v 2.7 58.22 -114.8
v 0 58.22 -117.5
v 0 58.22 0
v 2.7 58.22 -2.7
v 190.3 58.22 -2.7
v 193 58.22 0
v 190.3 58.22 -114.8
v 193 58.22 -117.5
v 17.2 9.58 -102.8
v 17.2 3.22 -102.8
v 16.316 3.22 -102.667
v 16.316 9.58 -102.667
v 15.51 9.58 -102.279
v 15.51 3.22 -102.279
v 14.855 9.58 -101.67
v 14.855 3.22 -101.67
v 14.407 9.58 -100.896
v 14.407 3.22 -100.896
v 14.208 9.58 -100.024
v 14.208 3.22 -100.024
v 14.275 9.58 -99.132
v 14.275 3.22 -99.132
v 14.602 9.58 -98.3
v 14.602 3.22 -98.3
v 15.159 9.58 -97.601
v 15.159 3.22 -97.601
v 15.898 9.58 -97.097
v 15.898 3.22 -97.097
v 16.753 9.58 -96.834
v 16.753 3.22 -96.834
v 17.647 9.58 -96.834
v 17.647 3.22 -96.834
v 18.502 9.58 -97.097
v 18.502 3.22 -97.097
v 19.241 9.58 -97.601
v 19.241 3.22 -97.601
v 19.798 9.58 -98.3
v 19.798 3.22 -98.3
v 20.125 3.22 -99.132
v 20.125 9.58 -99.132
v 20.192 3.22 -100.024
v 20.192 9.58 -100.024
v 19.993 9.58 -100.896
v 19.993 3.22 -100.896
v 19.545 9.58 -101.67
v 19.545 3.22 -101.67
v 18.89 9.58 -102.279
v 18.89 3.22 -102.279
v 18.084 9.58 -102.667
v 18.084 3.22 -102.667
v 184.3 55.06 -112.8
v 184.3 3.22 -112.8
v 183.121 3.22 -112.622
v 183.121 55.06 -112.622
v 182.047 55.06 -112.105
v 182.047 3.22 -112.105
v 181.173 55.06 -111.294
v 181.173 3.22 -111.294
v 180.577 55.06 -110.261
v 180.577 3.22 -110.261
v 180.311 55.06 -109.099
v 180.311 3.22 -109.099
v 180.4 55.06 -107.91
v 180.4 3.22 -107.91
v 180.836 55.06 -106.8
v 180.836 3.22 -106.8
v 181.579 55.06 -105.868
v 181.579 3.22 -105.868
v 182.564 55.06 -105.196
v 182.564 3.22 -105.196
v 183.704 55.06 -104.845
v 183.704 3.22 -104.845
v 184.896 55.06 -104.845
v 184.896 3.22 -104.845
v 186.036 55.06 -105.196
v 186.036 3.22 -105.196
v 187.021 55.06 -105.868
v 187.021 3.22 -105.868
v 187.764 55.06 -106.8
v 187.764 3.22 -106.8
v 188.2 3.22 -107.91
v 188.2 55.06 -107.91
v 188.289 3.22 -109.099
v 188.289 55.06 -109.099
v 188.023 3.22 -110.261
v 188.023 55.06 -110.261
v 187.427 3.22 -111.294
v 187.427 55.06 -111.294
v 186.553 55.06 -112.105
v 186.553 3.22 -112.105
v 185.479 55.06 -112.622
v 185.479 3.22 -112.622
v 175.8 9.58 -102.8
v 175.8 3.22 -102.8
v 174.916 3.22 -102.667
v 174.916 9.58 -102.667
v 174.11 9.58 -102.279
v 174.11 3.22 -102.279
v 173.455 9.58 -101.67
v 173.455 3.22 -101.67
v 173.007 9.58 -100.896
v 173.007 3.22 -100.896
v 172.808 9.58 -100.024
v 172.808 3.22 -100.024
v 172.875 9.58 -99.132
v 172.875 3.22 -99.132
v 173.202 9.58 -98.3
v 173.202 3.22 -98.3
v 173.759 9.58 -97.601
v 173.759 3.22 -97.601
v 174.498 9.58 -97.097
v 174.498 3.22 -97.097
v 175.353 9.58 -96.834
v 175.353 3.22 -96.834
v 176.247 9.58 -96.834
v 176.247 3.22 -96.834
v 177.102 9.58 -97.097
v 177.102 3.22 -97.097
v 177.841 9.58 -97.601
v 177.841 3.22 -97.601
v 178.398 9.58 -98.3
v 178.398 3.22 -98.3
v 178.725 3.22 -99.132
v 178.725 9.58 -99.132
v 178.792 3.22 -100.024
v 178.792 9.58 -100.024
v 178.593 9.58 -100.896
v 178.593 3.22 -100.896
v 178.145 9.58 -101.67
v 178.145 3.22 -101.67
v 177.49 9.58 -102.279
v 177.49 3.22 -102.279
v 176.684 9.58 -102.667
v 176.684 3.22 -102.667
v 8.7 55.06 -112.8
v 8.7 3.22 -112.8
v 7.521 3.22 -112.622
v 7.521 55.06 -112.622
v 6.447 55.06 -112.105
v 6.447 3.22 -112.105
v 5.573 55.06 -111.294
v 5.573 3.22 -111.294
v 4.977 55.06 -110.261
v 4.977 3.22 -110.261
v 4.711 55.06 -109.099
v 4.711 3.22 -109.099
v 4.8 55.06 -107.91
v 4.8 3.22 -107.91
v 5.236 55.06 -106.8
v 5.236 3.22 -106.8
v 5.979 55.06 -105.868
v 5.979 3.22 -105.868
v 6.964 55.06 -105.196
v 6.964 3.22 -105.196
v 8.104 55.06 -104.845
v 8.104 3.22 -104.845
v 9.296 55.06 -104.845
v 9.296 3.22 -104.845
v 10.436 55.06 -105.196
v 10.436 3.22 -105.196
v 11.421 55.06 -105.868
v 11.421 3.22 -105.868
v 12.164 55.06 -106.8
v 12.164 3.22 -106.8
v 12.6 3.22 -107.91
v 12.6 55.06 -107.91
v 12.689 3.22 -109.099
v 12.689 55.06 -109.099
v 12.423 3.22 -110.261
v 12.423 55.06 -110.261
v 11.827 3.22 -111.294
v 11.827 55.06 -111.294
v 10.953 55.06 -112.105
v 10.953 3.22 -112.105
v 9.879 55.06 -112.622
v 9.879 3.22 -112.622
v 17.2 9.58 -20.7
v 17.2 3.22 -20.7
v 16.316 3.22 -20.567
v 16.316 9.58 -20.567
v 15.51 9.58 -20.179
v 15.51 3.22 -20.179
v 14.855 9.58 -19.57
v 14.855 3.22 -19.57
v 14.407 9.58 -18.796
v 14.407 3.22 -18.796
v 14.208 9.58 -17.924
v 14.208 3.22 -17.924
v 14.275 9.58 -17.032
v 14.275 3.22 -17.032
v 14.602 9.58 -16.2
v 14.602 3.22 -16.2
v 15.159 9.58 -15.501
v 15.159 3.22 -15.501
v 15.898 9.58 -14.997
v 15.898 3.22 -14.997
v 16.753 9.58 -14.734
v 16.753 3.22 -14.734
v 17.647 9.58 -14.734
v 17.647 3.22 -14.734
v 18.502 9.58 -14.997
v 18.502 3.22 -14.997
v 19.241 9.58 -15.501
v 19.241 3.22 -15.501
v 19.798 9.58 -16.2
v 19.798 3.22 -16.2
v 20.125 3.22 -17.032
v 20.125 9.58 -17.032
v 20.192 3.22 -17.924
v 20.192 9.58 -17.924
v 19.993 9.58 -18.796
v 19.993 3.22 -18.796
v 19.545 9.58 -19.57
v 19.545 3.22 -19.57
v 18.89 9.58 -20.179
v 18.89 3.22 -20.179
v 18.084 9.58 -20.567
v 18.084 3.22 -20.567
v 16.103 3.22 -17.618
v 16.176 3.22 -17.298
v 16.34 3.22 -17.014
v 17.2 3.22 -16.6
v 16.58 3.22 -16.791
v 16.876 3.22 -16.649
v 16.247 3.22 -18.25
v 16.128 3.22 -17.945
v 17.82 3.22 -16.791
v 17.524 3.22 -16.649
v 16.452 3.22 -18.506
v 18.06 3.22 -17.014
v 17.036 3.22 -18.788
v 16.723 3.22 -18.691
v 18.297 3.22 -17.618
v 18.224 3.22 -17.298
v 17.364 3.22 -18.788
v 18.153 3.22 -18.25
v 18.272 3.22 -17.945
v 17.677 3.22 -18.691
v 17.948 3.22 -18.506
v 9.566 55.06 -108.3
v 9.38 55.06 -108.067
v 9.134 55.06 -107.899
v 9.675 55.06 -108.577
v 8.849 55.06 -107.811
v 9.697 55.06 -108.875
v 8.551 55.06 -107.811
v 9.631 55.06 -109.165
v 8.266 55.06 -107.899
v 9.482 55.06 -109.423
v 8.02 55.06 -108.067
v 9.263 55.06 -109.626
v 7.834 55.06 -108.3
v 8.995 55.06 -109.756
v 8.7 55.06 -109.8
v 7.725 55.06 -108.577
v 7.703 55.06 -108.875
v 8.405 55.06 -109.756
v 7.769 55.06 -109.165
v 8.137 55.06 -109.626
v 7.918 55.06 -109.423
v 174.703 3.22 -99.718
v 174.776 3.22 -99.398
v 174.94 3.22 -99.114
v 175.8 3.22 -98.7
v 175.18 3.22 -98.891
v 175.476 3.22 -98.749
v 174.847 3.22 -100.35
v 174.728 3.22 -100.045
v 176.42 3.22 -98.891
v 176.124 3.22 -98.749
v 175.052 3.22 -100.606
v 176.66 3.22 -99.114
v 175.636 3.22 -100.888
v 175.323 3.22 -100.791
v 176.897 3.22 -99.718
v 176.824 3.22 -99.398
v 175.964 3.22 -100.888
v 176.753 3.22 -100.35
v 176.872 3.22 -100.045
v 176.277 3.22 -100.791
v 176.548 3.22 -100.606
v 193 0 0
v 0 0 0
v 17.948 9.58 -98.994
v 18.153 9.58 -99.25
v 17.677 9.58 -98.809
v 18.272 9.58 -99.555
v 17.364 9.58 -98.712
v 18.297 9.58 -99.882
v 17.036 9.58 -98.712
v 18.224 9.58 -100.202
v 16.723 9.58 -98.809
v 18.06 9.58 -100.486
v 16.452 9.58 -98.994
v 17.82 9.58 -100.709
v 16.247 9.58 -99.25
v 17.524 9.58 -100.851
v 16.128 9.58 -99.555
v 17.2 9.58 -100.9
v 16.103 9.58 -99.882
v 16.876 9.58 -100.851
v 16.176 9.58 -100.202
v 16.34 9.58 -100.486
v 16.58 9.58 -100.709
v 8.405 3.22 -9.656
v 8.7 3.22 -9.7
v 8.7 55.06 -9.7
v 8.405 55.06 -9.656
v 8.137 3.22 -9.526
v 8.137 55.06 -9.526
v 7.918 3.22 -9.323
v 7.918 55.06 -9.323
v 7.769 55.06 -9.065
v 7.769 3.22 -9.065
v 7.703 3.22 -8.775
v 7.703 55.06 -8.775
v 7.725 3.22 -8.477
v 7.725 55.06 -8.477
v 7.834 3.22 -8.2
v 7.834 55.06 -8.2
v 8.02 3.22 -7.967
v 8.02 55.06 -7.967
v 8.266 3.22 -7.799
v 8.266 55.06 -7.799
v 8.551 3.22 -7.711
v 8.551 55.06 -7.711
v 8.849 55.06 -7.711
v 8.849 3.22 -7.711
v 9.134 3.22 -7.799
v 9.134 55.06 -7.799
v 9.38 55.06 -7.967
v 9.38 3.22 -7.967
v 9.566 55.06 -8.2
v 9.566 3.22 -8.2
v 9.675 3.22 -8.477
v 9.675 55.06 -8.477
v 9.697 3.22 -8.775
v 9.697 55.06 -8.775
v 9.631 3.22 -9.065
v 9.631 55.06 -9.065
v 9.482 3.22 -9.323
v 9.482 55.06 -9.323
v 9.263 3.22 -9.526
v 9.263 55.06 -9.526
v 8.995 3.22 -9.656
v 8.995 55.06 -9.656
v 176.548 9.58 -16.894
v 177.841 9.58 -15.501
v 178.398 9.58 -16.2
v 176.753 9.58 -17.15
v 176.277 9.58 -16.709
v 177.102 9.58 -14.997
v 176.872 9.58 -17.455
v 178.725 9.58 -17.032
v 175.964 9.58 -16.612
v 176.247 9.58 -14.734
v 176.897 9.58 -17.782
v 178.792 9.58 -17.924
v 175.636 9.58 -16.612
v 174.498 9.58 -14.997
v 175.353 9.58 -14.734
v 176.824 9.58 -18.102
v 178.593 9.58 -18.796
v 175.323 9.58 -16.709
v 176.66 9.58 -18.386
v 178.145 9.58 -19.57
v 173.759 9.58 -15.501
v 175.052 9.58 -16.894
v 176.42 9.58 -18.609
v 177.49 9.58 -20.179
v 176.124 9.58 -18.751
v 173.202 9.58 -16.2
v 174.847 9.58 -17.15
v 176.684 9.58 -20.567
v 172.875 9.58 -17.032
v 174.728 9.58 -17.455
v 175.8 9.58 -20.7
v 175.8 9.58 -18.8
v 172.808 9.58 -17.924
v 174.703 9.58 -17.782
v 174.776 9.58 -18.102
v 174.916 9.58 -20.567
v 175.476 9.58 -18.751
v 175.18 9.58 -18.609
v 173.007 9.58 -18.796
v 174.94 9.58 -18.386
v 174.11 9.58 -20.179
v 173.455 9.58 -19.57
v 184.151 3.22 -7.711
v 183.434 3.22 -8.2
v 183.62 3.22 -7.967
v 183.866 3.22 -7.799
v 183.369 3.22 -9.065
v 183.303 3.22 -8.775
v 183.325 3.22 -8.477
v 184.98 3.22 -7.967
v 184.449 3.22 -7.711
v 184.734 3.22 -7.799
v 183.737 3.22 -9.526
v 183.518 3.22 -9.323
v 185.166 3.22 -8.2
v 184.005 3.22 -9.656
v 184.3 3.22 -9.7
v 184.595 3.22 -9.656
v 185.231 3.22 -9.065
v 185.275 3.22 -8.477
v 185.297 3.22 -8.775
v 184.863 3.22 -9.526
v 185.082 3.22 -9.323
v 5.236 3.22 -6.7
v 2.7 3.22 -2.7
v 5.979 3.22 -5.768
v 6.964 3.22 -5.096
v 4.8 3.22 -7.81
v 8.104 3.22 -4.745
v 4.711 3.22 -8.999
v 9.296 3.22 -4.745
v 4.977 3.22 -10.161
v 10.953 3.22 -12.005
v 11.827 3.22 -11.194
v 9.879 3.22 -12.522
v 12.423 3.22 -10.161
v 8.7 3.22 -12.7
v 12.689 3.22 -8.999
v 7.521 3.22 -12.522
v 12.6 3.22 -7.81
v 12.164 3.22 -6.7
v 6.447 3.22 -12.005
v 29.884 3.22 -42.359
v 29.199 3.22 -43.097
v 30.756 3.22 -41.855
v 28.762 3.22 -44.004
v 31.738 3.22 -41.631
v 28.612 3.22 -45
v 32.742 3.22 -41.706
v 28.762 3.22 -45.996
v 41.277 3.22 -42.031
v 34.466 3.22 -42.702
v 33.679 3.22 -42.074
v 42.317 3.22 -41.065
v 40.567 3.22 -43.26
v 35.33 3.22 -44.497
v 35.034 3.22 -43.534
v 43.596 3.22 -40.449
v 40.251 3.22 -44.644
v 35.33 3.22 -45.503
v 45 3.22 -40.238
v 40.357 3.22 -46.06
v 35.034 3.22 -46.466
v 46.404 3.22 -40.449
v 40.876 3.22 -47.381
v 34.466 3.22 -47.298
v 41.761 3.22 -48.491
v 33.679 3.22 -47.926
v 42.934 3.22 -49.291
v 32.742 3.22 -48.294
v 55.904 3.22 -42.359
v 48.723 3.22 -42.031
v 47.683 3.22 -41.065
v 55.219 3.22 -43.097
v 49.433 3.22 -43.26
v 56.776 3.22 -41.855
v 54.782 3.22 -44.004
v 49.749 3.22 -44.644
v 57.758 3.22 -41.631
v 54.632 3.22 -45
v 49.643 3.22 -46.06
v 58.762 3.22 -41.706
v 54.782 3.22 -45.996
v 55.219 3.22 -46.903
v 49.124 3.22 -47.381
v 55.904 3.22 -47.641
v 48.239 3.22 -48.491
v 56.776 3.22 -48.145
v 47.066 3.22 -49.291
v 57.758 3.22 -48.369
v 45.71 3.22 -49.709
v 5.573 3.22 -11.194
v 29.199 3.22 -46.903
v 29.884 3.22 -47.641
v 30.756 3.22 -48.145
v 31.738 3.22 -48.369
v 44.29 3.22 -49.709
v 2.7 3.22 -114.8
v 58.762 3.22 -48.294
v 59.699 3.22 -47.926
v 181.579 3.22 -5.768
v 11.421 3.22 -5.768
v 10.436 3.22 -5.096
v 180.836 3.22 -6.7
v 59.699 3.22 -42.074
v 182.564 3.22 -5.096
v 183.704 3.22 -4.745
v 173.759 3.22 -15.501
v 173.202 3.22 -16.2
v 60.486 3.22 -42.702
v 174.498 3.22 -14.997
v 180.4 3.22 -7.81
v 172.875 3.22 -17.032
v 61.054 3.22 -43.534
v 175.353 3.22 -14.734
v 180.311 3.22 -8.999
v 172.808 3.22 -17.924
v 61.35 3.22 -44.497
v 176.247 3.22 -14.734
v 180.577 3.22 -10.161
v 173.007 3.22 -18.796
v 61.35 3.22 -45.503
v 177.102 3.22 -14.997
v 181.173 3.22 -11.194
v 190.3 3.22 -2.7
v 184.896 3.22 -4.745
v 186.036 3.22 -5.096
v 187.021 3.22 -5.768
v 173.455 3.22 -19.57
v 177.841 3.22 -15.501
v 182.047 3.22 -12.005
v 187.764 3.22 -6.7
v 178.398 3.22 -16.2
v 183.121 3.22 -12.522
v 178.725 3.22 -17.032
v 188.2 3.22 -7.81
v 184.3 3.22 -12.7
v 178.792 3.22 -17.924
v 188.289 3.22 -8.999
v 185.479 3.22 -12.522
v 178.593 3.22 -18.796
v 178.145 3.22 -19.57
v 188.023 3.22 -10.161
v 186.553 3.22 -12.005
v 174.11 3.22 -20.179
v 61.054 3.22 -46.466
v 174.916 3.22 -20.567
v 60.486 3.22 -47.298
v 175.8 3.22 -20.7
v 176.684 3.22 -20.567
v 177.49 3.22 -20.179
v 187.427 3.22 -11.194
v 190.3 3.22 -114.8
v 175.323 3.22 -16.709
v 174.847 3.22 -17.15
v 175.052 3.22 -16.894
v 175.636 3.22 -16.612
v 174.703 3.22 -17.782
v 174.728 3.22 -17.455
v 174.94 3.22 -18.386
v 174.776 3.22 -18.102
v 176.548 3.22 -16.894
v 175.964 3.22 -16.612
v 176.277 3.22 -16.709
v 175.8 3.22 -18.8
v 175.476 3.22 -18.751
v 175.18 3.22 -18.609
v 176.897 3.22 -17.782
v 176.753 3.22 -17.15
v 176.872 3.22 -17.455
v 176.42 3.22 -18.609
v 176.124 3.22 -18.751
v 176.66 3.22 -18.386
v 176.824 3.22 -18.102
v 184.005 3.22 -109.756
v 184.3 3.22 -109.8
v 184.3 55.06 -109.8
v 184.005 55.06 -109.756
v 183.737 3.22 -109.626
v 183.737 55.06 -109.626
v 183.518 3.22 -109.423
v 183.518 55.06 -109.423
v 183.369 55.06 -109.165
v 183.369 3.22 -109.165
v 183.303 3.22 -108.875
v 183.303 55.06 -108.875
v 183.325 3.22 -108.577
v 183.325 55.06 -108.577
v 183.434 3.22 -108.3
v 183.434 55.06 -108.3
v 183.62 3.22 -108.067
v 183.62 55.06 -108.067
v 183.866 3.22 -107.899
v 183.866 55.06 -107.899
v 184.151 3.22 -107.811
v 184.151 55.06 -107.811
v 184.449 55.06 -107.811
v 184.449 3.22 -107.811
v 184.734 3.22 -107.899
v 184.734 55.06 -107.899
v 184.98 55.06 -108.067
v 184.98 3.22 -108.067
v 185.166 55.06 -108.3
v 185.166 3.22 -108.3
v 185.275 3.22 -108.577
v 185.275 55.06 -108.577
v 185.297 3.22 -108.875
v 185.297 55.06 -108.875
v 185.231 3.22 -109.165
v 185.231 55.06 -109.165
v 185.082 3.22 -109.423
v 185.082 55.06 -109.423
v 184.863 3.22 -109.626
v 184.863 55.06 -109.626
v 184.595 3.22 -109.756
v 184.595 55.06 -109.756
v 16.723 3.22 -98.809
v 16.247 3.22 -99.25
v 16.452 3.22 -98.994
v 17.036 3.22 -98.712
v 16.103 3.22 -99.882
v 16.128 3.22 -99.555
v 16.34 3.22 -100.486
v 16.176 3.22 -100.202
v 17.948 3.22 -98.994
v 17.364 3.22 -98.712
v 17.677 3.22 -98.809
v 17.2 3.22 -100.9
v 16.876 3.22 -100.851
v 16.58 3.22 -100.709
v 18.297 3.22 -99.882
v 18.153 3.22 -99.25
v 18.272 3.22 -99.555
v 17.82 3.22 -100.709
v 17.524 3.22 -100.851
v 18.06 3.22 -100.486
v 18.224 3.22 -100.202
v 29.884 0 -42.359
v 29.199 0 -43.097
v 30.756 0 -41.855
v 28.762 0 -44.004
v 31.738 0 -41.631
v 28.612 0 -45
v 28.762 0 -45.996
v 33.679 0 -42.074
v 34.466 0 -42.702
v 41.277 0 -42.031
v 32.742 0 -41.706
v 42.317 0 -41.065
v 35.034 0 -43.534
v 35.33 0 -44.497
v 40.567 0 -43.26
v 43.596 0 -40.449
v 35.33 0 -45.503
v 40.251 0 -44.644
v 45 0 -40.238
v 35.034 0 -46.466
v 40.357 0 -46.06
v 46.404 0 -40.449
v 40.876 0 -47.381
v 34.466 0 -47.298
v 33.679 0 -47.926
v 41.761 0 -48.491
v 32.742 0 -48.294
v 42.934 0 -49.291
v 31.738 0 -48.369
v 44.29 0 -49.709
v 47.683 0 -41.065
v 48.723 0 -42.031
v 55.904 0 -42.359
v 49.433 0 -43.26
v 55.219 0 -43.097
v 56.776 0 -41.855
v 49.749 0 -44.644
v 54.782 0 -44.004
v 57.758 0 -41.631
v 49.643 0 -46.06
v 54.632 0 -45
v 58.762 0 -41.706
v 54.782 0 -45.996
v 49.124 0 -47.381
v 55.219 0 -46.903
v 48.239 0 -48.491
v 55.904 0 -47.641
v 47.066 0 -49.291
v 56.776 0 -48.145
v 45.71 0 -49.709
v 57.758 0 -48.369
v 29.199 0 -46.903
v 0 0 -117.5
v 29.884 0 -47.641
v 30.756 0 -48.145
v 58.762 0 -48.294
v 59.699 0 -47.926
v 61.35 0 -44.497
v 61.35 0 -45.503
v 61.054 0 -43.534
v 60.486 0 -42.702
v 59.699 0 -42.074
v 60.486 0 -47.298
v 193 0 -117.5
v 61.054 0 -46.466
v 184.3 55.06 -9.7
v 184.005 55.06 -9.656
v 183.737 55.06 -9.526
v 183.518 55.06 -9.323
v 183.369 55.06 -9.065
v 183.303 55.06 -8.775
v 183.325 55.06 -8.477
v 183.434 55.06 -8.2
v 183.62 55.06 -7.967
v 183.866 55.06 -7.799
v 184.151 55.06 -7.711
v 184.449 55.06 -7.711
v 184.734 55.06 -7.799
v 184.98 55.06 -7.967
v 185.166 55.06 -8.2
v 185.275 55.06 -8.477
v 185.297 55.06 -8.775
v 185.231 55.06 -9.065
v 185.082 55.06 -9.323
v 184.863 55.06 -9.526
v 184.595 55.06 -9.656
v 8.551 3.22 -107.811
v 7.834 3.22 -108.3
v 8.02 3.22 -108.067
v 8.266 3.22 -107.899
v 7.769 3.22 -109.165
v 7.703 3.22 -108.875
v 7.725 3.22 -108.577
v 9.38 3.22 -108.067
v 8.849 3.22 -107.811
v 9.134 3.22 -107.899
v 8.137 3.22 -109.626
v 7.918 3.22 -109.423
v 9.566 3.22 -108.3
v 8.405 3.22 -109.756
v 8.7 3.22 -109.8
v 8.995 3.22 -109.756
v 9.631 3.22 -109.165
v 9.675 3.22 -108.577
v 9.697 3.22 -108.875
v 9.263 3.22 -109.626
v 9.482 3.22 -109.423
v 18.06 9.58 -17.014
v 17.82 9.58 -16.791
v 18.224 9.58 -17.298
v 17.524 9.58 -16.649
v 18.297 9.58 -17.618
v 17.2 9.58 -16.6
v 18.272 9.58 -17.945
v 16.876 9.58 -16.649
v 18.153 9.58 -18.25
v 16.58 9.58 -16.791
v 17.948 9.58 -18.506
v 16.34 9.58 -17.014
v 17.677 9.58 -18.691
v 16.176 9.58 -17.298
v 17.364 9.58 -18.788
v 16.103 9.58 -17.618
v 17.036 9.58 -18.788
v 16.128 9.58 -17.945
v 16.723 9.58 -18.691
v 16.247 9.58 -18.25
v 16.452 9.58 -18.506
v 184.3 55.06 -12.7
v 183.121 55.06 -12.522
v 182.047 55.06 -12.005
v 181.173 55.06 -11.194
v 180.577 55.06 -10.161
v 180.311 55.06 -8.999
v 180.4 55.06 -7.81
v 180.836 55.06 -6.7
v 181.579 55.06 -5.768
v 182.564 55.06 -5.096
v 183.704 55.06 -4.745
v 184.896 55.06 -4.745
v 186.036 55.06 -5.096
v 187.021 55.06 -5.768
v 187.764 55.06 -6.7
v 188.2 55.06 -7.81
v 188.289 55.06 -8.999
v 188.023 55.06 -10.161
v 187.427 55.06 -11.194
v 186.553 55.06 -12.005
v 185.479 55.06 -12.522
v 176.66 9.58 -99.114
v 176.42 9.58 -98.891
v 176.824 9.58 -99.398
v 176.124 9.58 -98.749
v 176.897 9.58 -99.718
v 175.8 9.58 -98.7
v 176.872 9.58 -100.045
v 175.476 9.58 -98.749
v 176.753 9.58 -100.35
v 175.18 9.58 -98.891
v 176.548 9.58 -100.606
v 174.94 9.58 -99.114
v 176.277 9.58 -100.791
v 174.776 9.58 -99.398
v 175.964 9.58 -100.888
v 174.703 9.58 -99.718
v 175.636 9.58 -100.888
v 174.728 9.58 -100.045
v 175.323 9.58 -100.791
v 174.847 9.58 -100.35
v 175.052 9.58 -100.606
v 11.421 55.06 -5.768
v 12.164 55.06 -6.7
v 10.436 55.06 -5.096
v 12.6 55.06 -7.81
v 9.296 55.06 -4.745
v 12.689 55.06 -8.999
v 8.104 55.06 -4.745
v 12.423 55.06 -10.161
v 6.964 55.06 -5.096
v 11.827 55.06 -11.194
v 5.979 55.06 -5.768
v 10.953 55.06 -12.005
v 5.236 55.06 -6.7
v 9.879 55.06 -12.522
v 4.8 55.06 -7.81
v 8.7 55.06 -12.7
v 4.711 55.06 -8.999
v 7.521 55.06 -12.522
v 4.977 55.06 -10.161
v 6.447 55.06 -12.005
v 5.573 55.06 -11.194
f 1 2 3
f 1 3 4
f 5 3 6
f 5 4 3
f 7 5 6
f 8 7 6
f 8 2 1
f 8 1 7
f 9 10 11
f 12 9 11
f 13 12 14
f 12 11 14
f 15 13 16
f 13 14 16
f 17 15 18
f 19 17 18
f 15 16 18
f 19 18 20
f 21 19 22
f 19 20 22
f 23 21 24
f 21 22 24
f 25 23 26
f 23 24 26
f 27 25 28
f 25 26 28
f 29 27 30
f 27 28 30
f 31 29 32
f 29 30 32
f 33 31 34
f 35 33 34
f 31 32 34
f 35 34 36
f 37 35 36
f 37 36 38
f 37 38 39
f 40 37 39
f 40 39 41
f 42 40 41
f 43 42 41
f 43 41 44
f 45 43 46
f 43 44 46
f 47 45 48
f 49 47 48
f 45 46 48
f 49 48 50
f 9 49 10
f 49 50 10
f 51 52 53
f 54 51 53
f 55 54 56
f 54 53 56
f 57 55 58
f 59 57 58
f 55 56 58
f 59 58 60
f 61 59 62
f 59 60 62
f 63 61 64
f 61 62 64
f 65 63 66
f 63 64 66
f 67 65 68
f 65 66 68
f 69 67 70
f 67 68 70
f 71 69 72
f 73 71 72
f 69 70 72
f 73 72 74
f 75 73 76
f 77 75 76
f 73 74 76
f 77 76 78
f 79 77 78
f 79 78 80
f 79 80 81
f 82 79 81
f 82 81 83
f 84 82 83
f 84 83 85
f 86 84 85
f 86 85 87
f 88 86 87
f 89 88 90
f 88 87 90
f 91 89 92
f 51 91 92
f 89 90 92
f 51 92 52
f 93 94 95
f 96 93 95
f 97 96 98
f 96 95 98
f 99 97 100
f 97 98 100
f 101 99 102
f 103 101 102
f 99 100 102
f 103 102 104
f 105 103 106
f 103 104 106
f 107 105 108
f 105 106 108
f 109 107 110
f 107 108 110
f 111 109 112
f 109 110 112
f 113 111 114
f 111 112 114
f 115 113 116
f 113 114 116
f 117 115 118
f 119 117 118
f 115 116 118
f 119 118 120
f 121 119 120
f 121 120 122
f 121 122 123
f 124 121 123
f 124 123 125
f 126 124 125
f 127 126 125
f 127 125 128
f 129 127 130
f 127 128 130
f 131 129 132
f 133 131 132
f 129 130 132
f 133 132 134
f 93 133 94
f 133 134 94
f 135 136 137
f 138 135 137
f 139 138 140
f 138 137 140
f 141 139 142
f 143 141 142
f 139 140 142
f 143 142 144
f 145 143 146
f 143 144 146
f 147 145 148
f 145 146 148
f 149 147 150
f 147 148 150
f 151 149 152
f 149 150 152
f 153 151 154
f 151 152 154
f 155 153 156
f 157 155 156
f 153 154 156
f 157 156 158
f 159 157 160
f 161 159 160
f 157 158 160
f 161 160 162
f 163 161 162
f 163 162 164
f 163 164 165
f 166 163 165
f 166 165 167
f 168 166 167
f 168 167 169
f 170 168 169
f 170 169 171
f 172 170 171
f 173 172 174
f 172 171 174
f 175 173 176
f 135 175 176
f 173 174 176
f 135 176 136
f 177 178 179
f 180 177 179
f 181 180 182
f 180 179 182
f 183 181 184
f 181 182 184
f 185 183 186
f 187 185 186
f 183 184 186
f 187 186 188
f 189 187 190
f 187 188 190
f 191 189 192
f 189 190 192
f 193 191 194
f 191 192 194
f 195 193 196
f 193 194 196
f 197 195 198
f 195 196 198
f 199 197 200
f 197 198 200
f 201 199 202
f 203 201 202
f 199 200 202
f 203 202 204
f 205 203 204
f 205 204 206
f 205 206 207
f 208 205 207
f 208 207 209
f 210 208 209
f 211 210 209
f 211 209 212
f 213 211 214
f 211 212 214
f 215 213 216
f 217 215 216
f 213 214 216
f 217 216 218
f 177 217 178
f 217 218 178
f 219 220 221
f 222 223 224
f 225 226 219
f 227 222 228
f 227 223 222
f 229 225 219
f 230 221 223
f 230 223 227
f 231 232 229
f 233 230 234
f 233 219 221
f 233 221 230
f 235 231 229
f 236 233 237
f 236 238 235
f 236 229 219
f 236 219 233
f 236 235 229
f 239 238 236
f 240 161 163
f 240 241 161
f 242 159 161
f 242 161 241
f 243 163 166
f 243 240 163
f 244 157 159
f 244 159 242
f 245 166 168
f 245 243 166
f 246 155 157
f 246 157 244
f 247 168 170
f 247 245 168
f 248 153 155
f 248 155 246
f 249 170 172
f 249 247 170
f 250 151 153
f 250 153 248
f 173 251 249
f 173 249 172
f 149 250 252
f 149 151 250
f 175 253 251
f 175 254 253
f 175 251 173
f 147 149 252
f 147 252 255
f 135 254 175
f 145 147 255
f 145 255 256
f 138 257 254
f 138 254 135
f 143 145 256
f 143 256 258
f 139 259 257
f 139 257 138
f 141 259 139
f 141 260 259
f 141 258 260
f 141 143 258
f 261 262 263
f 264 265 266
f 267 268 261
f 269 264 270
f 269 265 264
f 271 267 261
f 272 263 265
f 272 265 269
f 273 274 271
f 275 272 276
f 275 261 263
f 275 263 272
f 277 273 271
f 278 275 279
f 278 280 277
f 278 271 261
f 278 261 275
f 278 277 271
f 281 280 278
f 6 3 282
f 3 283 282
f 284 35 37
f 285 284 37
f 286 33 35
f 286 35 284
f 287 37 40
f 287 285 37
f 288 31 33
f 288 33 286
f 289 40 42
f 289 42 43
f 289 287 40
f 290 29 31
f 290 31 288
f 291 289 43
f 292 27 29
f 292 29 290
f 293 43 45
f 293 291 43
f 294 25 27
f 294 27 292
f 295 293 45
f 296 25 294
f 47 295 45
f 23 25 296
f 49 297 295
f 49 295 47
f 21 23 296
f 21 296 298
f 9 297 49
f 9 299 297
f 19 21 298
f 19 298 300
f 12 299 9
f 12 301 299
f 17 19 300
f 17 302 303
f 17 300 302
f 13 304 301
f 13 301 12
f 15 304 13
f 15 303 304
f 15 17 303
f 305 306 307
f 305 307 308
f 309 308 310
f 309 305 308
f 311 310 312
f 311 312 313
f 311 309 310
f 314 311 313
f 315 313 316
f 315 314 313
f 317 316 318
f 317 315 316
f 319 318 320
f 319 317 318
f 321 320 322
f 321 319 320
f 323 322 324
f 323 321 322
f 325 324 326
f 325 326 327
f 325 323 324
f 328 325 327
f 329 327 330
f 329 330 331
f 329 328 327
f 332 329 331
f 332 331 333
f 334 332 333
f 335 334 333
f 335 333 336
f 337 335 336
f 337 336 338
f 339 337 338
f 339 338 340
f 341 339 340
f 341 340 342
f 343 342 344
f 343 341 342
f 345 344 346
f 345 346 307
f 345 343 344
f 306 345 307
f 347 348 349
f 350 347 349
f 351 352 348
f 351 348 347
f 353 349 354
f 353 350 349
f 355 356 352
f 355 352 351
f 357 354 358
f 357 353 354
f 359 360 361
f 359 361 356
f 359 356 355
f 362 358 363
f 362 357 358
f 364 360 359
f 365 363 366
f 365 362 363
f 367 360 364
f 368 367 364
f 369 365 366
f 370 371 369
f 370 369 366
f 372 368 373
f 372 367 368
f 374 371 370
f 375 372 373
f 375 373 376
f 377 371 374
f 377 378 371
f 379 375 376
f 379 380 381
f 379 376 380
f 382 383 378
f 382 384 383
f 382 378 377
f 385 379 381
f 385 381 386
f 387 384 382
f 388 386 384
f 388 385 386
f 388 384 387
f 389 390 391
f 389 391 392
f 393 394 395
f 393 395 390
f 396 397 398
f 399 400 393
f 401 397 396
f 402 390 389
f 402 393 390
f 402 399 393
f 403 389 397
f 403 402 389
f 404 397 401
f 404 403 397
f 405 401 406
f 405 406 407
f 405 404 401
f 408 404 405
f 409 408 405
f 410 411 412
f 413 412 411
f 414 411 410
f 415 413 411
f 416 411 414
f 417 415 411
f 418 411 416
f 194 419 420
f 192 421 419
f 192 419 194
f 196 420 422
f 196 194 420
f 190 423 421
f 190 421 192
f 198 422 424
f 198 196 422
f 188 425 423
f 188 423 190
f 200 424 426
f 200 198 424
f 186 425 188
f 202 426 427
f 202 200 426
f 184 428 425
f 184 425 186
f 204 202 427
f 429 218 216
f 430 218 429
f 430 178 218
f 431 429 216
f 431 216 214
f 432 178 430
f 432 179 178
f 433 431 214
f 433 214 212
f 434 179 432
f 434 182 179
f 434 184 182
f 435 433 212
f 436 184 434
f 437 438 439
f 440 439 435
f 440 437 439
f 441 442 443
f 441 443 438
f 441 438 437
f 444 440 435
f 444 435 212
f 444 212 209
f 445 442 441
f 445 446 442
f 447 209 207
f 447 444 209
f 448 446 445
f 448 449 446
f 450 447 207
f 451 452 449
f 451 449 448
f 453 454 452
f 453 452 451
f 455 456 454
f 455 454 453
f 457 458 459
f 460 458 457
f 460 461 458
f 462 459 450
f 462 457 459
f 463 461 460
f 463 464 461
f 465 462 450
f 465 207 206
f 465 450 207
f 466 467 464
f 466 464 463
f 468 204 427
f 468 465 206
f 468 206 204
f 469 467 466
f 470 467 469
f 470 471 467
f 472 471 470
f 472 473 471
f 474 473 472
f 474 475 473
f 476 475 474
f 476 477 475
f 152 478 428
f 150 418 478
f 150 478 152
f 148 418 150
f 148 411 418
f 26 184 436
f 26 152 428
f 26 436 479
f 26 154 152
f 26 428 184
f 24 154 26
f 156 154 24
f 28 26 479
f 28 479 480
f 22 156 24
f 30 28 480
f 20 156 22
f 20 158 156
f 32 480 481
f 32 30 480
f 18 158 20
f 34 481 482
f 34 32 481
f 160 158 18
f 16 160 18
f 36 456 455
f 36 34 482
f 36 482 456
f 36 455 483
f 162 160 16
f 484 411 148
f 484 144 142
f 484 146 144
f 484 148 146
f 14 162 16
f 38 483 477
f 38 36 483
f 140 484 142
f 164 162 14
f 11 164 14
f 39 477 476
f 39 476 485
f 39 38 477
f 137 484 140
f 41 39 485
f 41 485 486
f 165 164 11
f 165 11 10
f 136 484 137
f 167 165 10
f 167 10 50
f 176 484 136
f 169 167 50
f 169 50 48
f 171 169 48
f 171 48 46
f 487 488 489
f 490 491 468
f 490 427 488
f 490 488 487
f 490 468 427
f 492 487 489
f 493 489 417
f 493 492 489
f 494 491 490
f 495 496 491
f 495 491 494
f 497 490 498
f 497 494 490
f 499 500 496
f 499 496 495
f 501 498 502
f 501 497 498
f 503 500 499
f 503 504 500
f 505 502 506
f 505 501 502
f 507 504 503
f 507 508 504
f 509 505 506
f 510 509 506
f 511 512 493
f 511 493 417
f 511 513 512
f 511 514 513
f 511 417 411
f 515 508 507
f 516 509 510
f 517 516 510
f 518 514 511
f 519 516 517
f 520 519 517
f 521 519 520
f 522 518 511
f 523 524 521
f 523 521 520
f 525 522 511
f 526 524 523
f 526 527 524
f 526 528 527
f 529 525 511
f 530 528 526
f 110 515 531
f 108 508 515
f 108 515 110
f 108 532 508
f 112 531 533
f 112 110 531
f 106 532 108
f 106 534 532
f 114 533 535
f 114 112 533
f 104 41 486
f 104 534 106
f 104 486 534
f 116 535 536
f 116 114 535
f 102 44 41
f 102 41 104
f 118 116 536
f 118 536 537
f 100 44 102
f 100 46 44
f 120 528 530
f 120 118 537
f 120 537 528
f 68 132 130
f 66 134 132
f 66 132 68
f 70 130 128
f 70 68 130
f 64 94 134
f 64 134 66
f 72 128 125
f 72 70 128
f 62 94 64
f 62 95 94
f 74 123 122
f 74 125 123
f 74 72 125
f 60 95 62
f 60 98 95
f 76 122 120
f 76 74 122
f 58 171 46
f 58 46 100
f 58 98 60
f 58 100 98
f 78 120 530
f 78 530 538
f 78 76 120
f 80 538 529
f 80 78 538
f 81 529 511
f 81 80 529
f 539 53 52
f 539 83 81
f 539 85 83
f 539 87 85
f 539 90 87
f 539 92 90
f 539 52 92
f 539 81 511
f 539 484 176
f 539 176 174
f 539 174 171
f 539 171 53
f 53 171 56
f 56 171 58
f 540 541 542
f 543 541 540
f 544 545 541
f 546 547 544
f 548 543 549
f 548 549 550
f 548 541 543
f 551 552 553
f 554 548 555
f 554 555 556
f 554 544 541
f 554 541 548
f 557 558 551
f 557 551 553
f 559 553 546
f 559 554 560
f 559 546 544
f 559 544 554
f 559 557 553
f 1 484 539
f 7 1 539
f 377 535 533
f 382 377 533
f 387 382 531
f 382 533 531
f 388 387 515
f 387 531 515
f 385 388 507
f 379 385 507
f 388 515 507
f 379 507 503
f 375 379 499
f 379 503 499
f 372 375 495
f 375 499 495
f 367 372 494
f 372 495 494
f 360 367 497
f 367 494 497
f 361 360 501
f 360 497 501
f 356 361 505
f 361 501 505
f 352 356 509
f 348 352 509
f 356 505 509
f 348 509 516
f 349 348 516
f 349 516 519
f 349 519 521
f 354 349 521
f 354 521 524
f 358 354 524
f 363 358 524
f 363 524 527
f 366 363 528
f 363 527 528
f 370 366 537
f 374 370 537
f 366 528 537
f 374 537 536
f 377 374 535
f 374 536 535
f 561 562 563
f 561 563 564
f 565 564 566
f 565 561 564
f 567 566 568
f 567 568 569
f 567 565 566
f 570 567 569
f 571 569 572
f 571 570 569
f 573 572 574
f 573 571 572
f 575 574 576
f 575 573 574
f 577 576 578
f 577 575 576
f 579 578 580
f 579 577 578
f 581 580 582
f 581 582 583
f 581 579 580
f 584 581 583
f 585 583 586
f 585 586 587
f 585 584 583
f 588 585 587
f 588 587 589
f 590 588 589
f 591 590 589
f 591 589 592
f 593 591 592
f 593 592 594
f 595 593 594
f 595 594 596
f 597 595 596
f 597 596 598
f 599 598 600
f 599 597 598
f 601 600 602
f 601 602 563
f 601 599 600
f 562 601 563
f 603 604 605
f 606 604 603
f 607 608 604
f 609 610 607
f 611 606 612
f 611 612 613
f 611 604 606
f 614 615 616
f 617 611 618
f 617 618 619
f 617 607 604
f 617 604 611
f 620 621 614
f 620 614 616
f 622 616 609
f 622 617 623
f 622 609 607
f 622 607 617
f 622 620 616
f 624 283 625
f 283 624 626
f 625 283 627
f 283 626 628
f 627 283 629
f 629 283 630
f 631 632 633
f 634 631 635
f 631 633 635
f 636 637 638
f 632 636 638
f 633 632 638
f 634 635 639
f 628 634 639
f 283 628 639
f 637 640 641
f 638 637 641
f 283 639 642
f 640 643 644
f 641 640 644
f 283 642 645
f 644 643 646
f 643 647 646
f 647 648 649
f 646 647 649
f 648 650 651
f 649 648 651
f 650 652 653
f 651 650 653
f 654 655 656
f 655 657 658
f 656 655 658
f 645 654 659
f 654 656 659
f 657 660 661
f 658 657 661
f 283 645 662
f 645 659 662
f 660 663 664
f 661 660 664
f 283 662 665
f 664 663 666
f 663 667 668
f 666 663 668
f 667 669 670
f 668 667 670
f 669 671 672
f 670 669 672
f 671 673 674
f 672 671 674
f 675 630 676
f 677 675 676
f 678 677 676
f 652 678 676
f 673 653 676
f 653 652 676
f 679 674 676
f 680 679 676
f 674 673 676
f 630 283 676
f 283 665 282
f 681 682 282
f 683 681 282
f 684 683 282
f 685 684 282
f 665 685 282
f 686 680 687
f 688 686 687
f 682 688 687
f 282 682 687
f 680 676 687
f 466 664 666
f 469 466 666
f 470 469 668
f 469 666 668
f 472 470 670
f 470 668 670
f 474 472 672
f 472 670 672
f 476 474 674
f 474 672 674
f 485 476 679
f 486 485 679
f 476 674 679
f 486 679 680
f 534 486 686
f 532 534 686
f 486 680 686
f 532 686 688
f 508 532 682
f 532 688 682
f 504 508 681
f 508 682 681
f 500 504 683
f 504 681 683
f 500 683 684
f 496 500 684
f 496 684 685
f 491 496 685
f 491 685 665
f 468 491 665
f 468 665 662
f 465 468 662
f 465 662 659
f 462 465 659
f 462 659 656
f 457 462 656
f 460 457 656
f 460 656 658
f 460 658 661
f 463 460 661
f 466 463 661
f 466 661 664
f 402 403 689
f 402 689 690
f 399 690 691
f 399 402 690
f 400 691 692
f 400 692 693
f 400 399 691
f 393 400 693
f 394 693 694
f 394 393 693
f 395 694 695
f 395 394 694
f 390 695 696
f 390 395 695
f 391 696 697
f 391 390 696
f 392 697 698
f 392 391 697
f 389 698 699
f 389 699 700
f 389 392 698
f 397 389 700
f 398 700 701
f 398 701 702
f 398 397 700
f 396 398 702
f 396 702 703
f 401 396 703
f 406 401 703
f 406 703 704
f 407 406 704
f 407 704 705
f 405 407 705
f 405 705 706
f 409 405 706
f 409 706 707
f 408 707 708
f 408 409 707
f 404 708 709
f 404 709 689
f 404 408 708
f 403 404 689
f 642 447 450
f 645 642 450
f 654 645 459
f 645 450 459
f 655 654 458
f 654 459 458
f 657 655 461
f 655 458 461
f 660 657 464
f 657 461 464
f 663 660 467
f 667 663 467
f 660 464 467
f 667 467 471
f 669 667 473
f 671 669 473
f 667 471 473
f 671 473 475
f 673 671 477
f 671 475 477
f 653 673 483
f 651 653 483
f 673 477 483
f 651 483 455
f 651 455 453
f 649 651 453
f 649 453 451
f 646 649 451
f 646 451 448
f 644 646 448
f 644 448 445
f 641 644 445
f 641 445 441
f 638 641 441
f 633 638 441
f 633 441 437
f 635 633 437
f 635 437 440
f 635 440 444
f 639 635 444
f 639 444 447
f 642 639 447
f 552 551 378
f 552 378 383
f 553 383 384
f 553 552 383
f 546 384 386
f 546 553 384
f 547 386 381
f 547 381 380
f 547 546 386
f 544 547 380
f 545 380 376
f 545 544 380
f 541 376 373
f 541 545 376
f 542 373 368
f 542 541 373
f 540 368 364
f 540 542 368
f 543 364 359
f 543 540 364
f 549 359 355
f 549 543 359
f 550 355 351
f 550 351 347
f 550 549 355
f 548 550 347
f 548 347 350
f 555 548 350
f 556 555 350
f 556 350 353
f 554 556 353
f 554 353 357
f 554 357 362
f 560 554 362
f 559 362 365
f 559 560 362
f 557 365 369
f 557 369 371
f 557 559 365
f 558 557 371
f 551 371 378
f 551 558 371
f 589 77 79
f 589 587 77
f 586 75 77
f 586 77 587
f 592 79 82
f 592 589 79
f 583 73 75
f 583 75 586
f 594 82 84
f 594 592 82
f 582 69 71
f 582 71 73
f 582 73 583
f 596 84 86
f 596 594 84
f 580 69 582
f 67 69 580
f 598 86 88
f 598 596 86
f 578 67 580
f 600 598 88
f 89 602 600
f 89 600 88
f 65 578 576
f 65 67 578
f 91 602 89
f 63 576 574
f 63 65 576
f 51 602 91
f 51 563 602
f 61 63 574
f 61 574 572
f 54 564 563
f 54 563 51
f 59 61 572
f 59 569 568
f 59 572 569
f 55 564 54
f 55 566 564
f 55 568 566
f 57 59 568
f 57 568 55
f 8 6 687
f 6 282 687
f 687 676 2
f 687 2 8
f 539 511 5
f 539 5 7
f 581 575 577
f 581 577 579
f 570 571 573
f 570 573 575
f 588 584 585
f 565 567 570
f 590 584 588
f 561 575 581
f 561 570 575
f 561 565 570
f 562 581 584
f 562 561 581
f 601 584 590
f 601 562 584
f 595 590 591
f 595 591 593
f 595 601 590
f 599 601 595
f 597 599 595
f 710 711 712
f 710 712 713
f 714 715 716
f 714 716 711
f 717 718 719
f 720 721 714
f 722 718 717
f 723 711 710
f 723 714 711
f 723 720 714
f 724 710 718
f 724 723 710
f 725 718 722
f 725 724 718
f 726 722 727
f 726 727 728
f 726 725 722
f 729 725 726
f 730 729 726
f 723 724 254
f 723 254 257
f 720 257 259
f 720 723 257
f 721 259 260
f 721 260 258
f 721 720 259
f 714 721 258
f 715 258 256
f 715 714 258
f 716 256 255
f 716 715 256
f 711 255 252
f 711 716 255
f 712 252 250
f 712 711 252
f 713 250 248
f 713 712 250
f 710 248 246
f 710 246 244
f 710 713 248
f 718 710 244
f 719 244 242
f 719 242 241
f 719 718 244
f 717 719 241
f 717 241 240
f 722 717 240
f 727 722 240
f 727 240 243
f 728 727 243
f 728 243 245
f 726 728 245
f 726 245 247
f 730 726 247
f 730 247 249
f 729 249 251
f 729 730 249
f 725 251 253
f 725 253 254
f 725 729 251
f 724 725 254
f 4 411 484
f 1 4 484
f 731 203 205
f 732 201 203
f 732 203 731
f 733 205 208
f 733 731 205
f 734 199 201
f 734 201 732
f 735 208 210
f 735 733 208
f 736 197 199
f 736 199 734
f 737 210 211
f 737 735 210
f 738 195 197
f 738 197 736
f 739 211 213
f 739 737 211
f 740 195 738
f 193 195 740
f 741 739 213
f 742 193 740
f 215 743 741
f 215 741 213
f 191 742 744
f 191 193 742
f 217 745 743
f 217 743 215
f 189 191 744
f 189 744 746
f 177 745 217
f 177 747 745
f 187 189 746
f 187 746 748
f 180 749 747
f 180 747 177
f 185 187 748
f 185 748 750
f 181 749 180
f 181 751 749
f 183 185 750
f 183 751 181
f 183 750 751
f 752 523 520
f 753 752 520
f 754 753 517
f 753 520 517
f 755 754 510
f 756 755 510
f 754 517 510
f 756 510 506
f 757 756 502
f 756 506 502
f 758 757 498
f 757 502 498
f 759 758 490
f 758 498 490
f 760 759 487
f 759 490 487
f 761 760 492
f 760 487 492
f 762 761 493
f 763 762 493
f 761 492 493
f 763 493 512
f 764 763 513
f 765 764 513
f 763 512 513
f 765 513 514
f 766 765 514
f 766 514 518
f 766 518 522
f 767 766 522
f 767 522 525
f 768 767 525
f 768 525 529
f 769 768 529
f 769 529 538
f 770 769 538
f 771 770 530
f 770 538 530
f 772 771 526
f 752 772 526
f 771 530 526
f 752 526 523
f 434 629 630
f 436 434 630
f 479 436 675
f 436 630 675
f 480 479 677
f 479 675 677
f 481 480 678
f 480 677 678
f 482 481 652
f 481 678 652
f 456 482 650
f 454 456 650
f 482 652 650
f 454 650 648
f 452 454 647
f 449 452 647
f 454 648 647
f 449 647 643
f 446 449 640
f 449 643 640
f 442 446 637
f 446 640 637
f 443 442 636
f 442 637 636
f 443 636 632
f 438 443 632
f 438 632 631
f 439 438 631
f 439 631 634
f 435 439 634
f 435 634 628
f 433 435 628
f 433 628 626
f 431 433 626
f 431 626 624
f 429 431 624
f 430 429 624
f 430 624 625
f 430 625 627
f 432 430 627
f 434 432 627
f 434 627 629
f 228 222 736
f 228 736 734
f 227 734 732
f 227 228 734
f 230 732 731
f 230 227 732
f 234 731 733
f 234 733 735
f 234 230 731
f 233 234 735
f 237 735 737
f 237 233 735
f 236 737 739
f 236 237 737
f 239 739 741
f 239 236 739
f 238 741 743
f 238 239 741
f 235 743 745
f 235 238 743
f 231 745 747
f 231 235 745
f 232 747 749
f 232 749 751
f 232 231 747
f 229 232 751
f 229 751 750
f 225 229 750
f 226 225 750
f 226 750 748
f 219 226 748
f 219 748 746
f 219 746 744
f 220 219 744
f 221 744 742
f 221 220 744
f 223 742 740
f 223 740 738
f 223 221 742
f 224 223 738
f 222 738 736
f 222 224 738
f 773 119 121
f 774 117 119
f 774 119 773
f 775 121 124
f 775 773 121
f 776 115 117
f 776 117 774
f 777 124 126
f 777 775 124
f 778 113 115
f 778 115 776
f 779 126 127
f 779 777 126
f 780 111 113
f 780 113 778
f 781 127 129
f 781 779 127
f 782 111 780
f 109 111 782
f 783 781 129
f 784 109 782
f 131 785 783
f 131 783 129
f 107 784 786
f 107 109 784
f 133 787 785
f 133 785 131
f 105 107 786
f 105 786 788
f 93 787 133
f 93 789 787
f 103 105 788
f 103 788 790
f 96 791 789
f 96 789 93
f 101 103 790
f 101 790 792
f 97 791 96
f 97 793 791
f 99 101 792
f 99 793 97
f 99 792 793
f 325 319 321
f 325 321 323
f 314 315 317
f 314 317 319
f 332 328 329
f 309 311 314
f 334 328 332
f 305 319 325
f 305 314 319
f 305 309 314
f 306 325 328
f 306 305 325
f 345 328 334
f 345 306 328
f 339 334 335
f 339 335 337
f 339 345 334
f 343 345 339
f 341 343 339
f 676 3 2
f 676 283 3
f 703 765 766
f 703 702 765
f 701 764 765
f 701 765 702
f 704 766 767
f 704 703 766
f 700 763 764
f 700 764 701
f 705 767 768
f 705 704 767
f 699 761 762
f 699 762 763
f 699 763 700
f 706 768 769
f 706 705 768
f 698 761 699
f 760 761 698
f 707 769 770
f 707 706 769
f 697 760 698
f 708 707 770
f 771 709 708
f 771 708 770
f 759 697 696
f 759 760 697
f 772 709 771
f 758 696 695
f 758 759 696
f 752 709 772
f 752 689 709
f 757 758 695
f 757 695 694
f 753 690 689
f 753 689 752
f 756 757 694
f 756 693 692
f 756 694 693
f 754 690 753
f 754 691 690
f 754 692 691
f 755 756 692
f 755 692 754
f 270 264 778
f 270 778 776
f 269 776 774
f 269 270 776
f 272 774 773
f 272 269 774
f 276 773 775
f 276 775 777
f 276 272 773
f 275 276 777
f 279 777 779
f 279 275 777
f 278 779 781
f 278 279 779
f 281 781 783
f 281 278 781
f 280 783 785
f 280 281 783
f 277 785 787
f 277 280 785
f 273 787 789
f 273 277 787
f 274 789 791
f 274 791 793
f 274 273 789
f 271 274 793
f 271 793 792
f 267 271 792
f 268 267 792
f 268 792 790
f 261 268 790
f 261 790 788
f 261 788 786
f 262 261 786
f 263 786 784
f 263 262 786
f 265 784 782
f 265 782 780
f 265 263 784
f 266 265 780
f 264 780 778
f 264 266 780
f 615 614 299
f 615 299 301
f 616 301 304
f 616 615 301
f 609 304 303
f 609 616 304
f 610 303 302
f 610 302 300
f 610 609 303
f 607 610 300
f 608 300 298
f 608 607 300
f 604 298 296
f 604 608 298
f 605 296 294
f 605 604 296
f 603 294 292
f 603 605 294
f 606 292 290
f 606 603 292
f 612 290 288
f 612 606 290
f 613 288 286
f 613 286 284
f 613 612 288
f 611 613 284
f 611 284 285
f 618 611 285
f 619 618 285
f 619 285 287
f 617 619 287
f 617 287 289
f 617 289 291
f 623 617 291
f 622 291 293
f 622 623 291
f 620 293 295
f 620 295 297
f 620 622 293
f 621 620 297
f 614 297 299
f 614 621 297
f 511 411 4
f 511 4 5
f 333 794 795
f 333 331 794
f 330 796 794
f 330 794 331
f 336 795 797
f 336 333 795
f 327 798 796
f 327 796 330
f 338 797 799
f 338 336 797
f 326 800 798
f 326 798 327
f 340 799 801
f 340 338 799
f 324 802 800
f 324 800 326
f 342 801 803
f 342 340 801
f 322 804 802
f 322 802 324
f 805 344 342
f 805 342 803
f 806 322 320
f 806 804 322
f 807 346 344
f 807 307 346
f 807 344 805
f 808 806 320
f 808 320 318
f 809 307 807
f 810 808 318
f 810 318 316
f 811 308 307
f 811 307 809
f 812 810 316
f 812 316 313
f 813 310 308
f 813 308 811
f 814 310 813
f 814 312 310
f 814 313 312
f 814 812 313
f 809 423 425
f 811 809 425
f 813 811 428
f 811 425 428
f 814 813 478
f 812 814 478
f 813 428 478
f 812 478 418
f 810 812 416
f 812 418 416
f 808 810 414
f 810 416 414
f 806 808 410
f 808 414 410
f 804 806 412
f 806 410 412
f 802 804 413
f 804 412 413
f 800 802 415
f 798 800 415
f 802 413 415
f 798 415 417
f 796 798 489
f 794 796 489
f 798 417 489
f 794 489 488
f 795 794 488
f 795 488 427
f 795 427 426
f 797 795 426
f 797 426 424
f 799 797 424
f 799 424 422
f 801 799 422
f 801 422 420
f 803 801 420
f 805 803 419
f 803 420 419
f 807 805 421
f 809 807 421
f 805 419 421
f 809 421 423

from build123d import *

# Parameters (mm, degrees)
SKETCH1_W               = 193
SKETCH1_H               = 117.5
BOSS_EXTRUDE1_DEPTH     = 3.22
SKETCH3_W               = 193
SKETCH3_H               = 117.5
SKETCH3_W_2             = 187.6
SKETCH3_H_2             = 112.1
BOSS_EXTRUDE2_DEPTH     = 55
SKETCH4_R               = 3
SKETCH4_R_2             = 1.1
BOSS_EXTRUDE3_DEPTH     = 6.36
SKETCH6_R               = 4
SKETCH6_R_2             = 1
BOSS_EXTRUDE4_DEPTH     = 51.84
SKETCH7_R               = 4.7625
CUT_EXTRUDE1_DEPTH      = 56
CUT_EXTRUDE1_DEPTH_BACK = 4.22
F_1_4_CLEARANCE_HOLE1_D = 6.7564


with BuildPart() as part:
    # Sketch1 → Boss-Extrude1 (new body)
    with BuildSketch(Plane(origin=(0, 0, 0), x_dir=(1, 0, 0), z_dir=(0, 1, 0))):
        with Locations((96.5, 58.75)):
            Rectangle(SKETCH1_W, SKETCH1_H)
    extrude(amount=BOSS_EXTRUDE1_DEPTH)

    # Sketch3 → Boss-Extrude2 (add)
    with BuildSketch(Plane(origin=(0, 3.22, 0), x_dir=(1, 0, 0), z_dir=(0, 1, 0))):
        with Locations((96.5, 58.75)):
            Rectangle(SKETCH3_W, SKETCH3_H)
        with Locations((96.5, 58.75)):
            Rectangle(SKETCH3_W_2, SKETCH3_H_2, mode=Mode.SUBTRACT)
    extrude(amount=BOSS_EXTRUDE2_DEPTH)

    # Sketch4 → Boss-Extrude3 (add)
    with BuildSketch(Plane(origin=(0, 3.22, 0), x_dir=(1, 0, 0), z_dir=(0, 1, 0))):
        with Locations(Location((17.2, 17.7, 0), (0, 0, 90))):  # turned: the seam where the file's is
            Circle(SKETCH4_R)
        with Locations(Location((17.2, 17.7, 0), (0, 0, 270))):  # turned: the seam where the file's is
            Circle(SKETCH4_R_2, mode=Mode.SUBTRACT)
        with Locations(Location((175.8, 17.7, 0), (0, 0, 90))):  # turned: the seam where the file's is
            Circle(SKETCH4_R)
        with Locations(Location((175.8, 17.7, 0), (0, 0, 90))):  # turned: the seam where the file's is
            Circle(SKETCH4_R_2, mode=Mode.SUBTRACT)
        with Locations(Location((17.2, 99.8, 0), (0, 0, 90))):  # turned: the seam where the file's is
            Circle(SKETCH4_R)
        with Locations(Location((17.2, 99.8, 0), (0, 0, 90))):  # turned: the seam where the file's is
            Circle(SKETCH4_R_2, mode=Mode.SUBTRACT)
        with Locations(Location((175.8, 99.8, 0), (0, 0, 90))):  # turned: the seam where the file's is
            Circle(SKETCH4_R)
        with Locations(Location((175.8, 99.8, 0), (0, 0, 270))):  # turned: the seam where the file's is
            Circle(SKETCH4_R_2, mode=Mode.SUBTRACT)
    extrude(amount=BOSS_EXTRUDE3_DEPTH)

    # Sketch6 → Boss-Extrude4 (add)
    with BuildSketch(Plane(origin=(0, 3.22, 0), x_dir=(1, 0, 0), z_dir=(0, 1, 0))):
        with Locations(Location((8.7, 8.7, 0), (0, 0, 90))):  # turned: the seam where the file's is
            Circle(SKETCH6_R)
        with Locations(Location((8.7, 8.7, 0), (0, 0, 90))):  # turned: the seam where the file's is
            Circle(SKETCH6_R_2, mode=Mode.SUBTRACT)
        with Locations(Location((184.3, 8.7, 0), (0, 0, 90))):  # turned: the seam where the file's is
            Circle(SKETCH6_R)
        with Locations(Location((184.3, 8.7, 0), (0, 0, 90))):  # turned: the seam where the file's is
            Circle(SKETCH6_R_2, mode=Mode.SUBTRACT)
        with Locations(Location((184.3, 108.8, 0), (0, 0, 90))):  # turned: the seam where the file's is
            Circle(SKETCH6_R)
        with Locations(Location((184.3, 108.8, 0), (0, 0, 90))):  # turned: the seam where the file's is
            Circle(SKETCH6_R_2, mode=Mode.SUBTRACT)
        with Locations(Location((8.7, 108.8, 0), (0, 0, 90))):  # turned: the seam where the file's is
            Circle(SKETCH6_R)
        with Locations(Location((8.7, 108.8, 0), (0, 0, 90))):  # turned: the seam where the file's is
            Circle(SKETCH6_R_2, mode=Mode.SUBTRACT)
    extrude(amount=BOSS_EXTRUDE4_DEPTH)

    # Sketch7 → Cut-Extrude1 (cut, two sides)
    with BuildSketch(Plane(origin=(0, 3.22, 0), x_dir=(1, 0, 0), z_dir=(0, 1, 0))) as cut_extrude1_sk:
        with Locations(Location((45, 45, 0), (0, 0, 270))):  # turned: the seam where the file's is
            Circle(SKETCH7_R)
    extrude(amount=CUT_EXTRUDE1_DEPTH, mode=Mode.SUBTRACT)
    extrude(cut_extrude1_sk.sketch, amount=-CUT_EXTRUDE1_DEPTH_BACK, mode=Mode.SUBTRACT)

    # 1/4 Clearance Hole1 (through all)
    with Locations(Plane(origin=(0, 3.22, 0), x_dir=(1, 0, 0), z_dir=(0, 1, 0))):
        with Locations((58.01, 45), (31.99, 45)):
            Hole(F_1_4_CLEARANCE_HOLE1_D / 2)


solid = part.part
